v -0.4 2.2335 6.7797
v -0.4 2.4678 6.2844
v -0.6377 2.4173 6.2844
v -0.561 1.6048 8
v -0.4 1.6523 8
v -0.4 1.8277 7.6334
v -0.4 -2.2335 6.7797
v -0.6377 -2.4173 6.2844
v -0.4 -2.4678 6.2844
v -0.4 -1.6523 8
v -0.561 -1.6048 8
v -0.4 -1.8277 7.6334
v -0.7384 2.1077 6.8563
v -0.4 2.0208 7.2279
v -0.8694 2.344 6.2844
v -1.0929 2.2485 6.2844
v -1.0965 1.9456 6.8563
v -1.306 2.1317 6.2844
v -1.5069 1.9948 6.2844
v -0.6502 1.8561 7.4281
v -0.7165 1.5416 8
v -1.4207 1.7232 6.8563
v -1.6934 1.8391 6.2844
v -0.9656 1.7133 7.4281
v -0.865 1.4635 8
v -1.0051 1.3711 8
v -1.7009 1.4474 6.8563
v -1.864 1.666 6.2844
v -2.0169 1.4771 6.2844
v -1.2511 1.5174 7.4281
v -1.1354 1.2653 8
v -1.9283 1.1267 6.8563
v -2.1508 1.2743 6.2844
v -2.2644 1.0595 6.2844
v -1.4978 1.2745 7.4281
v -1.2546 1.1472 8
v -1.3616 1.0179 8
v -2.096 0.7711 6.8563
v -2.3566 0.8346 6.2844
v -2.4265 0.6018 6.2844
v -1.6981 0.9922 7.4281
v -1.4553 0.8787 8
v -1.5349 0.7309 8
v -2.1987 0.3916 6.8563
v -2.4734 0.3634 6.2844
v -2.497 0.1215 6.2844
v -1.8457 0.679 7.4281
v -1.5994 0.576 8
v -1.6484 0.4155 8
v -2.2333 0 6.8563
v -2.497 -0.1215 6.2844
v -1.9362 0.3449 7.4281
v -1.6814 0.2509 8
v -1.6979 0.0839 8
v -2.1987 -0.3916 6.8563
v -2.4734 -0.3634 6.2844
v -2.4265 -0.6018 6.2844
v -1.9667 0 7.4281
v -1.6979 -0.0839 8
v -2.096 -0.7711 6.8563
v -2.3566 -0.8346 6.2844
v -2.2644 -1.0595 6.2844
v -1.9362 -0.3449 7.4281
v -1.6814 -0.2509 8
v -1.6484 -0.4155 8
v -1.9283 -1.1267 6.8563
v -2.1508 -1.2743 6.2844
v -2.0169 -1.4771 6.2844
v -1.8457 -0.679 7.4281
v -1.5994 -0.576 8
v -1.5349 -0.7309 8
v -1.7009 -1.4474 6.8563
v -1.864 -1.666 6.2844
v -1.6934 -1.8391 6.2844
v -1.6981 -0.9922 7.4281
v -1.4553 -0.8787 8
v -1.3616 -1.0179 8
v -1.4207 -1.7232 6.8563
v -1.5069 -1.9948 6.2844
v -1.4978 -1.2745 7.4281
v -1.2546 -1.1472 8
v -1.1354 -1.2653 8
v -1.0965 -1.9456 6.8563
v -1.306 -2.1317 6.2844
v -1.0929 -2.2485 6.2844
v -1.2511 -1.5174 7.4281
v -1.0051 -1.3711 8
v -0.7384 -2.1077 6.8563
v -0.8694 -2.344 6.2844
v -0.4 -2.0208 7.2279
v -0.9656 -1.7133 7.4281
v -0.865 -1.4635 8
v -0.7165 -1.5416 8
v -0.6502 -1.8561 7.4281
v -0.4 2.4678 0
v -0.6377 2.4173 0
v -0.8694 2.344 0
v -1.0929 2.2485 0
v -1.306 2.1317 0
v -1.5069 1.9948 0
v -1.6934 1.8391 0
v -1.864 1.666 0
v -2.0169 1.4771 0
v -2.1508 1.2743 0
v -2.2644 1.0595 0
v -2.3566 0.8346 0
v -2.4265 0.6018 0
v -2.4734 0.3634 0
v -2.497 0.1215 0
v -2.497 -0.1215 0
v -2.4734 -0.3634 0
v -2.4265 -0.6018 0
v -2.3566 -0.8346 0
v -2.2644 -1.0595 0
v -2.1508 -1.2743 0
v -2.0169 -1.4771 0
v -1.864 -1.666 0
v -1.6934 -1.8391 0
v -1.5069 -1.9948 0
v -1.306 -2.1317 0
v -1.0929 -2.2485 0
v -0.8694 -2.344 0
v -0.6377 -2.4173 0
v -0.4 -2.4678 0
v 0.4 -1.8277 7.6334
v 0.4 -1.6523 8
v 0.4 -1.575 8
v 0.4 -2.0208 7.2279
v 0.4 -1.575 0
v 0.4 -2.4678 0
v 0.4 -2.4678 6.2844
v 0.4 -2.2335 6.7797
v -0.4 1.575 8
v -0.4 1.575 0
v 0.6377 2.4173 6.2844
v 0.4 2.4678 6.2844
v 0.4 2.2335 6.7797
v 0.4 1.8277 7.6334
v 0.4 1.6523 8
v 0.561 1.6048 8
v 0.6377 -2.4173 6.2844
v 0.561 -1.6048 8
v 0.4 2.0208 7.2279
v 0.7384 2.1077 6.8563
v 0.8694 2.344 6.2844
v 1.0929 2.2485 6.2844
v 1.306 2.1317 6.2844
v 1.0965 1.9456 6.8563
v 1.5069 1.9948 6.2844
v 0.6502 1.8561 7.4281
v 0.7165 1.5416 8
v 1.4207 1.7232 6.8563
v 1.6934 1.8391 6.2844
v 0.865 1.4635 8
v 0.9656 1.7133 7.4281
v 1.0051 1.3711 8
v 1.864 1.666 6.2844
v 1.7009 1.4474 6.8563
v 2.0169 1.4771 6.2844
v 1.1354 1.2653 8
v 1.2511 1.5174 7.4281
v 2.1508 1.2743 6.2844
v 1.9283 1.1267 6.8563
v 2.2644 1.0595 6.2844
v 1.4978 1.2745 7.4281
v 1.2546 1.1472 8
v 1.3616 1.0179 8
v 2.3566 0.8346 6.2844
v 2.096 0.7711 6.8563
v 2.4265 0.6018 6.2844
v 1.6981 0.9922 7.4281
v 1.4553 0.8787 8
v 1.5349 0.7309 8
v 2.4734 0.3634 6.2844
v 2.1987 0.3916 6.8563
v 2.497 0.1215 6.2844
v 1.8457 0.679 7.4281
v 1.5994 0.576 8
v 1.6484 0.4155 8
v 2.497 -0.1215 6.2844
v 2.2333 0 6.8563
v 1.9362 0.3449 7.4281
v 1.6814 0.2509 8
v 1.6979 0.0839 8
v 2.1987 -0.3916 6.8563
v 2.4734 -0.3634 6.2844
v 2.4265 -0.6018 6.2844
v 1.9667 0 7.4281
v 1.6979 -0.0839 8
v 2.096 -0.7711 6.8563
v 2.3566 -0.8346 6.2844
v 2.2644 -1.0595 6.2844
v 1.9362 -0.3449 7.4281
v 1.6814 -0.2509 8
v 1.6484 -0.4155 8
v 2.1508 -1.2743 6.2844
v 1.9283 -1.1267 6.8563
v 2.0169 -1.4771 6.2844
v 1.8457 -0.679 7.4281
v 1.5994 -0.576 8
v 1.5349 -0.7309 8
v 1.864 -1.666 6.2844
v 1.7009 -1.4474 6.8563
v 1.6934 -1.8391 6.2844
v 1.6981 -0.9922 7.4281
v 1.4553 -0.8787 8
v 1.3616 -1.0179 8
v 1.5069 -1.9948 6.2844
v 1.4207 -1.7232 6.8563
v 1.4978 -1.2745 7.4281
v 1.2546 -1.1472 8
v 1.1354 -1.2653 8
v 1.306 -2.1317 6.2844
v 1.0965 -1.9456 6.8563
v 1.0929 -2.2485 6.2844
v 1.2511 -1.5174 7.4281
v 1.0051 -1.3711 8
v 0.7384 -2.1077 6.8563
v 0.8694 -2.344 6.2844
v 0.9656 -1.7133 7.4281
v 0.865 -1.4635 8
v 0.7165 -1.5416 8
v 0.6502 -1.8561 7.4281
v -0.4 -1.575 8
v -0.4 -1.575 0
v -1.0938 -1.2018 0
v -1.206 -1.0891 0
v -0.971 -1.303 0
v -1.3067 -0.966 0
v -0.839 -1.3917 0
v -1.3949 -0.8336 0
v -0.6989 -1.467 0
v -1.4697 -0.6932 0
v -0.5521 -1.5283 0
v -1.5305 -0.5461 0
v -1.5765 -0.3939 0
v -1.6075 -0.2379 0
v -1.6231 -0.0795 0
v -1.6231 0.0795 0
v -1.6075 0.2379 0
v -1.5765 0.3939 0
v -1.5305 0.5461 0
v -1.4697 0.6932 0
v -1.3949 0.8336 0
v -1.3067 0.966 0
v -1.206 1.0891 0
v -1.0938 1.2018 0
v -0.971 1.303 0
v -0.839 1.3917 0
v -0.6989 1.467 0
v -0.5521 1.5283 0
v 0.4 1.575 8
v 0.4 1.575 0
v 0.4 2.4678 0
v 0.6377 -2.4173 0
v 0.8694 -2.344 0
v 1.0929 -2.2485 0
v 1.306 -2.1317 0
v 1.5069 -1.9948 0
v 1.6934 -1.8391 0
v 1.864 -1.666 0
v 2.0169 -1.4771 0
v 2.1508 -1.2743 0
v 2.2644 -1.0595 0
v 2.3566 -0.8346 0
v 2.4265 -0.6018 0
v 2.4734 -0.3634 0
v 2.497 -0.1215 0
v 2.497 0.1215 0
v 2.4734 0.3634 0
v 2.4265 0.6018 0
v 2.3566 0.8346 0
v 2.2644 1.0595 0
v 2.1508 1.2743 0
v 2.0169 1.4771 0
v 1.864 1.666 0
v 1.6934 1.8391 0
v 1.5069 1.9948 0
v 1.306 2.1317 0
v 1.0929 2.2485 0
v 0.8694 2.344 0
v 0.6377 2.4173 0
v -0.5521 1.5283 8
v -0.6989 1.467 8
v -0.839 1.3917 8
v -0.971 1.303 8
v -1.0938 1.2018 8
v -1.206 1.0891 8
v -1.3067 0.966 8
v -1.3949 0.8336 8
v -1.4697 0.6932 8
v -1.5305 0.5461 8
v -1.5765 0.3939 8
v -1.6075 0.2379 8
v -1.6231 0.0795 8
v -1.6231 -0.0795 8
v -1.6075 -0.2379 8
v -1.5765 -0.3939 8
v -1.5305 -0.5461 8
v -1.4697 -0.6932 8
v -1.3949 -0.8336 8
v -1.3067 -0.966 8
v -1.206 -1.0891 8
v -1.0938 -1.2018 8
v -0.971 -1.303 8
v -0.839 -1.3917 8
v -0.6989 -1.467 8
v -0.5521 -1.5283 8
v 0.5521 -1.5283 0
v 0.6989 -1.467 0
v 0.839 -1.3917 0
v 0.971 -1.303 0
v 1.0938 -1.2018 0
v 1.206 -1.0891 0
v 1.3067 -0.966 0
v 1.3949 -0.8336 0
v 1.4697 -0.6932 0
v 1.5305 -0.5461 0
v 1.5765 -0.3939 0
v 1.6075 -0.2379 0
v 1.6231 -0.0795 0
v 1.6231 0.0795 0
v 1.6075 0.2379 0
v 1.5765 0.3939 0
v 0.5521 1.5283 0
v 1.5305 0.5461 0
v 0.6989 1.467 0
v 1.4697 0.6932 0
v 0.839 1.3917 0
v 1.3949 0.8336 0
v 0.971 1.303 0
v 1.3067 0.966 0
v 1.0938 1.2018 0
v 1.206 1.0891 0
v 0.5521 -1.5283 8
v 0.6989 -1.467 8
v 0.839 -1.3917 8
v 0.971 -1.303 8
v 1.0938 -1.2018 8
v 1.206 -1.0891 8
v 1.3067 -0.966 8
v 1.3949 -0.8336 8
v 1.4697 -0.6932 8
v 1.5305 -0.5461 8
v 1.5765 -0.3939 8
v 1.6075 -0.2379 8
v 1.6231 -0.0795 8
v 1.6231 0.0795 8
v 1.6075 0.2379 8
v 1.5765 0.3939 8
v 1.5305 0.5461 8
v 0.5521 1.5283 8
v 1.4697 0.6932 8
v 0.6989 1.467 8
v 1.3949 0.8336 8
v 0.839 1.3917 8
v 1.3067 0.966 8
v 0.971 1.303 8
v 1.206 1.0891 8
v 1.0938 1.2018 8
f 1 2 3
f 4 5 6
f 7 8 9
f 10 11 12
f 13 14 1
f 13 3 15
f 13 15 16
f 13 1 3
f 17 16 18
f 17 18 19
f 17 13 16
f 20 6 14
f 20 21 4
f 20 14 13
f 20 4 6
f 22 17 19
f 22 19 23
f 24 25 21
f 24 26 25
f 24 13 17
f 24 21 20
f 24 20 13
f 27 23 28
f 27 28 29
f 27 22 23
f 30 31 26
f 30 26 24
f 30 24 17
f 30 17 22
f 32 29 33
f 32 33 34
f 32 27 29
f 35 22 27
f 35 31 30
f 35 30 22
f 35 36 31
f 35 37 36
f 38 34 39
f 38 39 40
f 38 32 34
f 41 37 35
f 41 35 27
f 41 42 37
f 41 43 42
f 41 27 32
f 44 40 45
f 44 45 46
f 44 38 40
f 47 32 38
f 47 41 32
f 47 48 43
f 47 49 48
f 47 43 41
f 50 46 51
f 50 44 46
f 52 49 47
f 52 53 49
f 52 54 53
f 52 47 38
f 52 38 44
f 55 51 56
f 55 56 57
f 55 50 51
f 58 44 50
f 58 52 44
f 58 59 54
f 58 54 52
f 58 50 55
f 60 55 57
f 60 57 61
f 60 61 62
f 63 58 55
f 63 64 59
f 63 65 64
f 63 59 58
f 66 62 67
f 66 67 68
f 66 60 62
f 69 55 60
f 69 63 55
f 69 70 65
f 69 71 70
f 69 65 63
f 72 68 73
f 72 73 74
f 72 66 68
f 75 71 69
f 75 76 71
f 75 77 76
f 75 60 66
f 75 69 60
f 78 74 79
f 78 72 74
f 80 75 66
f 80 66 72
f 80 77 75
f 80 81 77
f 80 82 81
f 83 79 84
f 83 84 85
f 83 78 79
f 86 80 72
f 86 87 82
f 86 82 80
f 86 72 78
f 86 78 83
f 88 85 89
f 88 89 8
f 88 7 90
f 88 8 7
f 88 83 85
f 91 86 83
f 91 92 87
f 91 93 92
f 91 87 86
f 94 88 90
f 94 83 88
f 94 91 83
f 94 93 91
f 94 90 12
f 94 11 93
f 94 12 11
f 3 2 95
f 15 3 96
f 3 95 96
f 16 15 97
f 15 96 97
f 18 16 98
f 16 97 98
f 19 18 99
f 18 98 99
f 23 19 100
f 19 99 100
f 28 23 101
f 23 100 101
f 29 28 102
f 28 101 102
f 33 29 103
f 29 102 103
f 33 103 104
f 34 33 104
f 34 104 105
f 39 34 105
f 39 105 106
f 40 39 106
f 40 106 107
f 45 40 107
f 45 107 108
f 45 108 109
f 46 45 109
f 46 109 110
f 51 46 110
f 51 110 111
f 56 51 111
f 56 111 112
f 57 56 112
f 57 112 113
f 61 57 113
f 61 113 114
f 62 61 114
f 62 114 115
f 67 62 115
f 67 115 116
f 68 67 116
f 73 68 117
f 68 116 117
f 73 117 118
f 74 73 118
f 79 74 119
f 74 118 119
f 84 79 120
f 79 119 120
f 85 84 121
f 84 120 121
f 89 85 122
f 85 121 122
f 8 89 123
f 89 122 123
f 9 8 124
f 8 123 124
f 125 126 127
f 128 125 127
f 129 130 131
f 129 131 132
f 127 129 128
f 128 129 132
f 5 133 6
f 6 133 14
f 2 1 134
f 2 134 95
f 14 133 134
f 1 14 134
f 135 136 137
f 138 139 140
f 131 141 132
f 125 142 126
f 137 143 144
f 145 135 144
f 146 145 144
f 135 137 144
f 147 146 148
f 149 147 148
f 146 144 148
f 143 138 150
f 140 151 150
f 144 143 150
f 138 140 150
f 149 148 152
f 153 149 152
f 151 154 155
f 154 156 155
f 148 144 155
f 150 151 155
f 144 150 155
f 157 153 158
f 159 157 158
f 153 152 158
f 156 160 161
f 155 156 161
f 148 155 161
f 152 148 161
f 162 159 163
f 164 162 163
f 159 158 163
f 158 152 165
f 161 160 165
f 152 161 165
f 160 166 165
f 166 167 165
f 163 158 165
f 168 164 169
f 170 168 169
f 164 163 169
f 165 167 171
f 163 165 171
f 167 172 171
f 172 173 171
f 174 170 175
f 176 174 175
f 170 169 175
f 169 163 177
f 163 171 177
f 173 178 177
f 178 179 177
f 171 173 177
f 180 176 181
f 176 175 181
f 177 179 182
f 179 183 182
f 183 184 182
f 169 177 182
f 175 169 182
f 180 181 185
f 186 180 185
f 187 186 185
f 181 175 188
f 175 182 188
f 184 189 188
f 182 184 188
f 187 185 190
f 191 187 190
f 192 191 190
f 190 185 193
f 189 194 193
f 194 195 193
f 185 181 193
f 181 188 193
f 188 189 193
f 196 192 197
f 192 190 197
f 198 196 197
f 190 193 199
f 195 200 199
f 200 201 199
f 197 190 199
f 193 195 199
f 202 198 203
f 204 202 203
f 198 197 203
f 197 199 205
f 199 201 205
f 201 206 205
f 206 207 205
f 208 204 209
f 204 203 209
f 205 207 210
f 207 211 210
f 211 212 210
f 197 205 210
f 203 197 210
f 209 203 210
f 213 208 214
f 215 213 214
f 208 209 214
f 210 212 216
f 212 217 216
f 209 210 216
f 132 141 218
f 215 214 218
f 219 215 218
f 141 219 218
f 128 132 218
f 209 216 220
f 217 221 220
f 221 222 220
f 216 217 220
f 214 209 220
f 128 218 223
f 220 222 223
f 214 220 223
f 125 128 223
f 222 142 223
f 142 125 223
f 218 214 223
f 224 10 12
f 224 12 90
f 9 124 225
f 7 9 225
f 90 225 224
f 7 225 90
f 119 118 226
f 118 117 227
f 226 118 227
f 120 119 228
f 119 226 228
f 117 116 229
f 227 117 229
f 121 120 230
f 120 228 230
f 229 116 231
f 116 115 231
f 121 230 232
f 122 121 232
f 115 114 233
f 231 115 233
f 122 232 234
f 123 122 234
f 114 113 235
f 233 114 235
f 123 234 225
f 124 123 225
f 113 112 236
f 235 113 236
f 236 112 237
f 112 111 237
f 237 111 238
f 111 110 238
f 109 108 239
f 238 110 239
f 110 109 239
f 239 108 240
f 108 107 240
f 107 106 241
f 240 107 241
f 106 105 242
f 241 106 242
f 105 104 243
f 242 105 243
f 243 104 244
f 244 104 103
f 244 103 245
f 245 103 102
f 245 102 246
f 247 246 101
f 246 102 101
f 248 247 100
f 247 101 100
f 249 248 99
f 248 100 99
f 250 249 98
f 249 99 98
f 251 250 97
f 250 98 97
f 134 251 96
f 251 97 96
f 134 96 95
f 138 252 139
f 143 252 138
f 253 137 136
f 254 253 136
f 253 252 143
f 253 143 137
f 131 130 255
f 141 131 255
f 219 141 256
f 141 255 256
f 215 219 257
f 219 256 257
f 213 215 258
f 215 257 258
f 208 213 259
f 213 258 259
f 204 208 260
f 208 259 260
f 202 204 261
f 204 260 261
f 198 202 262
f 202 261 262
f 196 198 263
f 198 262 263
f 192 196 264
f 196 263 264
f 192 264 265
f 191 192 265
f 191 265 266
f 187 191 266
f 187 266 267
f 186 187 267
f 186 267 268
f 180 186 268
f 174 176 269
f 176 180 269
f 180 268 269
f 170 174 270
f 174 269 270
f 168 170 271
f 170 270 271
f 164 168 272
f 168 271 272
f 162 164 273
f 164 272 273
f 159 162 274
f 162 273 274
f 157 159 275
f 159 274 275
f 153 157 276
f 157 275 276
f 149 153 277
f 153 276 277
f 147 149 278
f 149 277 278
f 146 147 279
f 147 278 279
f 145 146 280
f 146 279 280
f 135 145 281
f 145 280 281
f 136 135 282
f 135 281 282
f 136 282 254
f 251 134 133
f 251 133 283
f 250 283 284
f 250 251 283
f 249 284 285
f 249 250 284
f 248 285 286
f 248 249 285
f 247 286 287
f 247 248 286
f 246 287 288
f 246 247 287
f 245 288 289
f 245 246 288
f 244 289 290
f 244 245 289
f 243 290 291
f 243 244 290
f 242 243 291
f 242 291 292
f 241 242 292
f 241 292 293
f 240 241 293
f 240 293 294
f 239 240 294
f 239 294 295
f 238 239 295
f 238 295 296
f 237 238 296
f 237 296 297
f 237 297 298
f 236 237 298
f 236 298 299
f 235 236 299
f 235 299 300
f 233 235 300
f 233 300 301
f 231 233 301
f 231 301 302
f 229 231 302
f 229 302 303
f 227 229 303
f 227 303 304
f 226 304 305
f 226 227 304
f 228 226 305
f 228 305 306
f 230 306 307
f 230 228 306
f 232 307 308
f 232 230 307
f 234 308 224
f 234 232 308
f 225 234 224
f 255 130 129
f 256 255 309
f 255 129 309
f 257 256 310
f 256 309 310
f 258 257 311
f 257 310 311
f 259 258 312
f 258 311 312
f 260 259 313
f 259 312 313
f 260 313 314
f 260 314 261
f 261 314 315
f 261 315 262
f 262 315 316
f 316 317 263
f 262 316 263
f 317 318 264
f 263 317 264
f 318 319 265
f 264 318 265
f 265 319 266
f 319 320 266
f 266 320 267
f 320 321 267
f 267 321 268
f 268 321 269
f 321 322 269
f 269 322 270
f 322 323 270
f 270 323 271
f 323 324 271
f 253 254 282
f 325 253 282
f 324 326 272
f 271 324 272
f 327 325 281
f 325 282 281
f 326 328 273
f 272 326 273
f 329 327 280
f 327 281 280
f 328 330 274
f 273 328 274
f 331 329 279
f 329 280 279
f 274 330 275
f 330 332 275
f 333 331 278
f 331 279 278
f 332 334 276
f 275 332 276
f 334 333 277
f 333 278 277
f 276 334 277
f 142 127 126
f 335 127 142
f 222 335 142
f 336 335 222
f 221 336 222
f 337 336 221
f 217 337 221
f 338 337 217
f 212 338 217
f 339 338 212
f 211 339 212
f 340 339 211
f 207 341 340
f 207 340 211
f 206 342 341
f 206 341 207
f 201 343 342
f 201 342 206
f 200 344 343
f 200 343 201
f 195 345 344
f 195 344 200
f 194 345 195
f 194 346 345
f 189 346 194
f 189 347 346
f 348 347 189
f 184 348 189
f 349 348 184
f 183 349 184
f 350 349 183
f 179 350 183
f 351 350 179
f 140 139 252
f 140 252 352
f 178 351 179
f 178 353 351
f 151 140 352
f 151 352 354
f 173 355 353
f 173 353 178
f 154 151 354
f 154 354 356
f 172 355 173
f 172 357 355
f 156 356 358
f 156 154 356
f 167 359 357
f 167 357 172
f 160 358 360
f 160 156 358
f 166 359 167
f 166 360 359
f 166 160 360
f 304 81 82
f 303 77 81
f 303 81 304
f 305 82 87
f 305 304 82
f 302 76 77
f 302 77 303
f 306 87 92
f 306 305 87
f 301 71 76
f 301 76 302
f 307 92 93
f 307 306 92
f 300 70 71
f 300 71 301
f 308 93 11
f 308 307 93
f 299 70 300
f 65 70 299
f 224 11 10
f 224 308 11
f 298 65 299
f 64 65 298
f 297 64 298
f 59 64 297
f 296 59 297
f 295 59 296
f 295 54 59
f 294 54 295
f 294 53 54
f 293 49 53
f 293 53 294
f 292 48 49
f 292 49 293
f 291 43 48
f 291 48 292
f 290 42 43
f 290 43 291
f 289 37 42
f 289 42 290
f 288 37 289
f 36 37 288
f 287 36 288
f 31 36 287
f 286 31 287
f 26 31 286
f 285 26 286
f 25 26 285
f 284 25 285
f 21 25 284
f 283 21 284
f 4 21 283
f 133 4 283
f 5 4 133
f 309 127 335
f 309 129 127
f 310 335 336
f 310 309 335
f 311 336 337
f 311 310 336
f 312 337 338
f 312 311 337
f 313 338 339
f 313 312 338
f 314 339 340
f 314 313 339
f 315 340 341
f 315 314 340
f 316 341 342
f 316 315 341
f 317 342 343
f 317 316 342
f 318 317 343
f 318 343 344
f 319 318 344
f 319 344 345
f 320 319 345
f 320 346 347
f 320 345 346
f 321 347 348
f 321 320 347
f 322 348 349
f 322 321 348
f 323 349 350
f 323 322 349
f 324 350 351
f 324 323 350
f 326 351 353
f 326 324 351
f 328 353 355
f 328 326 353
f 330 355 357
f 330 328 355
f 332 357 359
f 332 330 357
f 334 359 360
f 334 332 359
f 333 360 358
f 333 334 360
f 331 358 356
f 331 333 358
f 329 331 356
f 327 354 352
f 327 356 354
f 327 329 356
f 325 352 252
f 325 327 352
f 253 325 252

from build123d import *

# Parameters (mm, degrees)
F0_R       = 2.5
F0_R_2     = 1.625
F1_DEPTH   = 8
F2_W       = 0.8
F2_H       = 6.0208404261
F3_DEPTH   = 25
F4_SIZE2   = 0.8
F4_SIZE    = 1.7156055364
F4_2_SIZE2 = 0.8
F4_2_SIZE  = 1.7156055364


with BuildPart() as f1:
    # F0 (on Top) → F1 (new body)
    with BuildSketch(Plane.XY):
        Circle(F0_R)
        Circle(F0_R_2, mode=Mode.SUBTRACT)
    extrude(amount=F1_DEPTH)

    # F2 (on Top) → F3 (cut)
    with BuildSketch(Plane.XY):
        with Locations((0, -0.0632625306)):
            Rectangle(F2_W, F2_H)
    extrude(amount=F3_DEPTH, mode=Mode.SUBTRACT)

    # F4
    f4_edges = [f1.edges().sort_by_distance(p)[0] for p in [
        (2.5, 0, 8),
    ]]
    f4_side = f1.faces().sort_by_distance((2.5, 0, 4))[0]
    chamfer(f4_edges, length=F4_SIZE, length2=F4_SIZE2, reference=f4_side)

    # F4#2
    f4_2_edges = [f1.edges().sort_by_distance(p)[0] for p in [
        (-2.5, 0, 8),
    ]]
    f4_2_side = f1.faces().sort_by_distance((-2.5, 0, 4))[0]
    chamfer(f4_2_edges, length=F4_2_SIZE, length2=F4_2_SIZE2, reference=f4_2_side)


solid = f1.part
